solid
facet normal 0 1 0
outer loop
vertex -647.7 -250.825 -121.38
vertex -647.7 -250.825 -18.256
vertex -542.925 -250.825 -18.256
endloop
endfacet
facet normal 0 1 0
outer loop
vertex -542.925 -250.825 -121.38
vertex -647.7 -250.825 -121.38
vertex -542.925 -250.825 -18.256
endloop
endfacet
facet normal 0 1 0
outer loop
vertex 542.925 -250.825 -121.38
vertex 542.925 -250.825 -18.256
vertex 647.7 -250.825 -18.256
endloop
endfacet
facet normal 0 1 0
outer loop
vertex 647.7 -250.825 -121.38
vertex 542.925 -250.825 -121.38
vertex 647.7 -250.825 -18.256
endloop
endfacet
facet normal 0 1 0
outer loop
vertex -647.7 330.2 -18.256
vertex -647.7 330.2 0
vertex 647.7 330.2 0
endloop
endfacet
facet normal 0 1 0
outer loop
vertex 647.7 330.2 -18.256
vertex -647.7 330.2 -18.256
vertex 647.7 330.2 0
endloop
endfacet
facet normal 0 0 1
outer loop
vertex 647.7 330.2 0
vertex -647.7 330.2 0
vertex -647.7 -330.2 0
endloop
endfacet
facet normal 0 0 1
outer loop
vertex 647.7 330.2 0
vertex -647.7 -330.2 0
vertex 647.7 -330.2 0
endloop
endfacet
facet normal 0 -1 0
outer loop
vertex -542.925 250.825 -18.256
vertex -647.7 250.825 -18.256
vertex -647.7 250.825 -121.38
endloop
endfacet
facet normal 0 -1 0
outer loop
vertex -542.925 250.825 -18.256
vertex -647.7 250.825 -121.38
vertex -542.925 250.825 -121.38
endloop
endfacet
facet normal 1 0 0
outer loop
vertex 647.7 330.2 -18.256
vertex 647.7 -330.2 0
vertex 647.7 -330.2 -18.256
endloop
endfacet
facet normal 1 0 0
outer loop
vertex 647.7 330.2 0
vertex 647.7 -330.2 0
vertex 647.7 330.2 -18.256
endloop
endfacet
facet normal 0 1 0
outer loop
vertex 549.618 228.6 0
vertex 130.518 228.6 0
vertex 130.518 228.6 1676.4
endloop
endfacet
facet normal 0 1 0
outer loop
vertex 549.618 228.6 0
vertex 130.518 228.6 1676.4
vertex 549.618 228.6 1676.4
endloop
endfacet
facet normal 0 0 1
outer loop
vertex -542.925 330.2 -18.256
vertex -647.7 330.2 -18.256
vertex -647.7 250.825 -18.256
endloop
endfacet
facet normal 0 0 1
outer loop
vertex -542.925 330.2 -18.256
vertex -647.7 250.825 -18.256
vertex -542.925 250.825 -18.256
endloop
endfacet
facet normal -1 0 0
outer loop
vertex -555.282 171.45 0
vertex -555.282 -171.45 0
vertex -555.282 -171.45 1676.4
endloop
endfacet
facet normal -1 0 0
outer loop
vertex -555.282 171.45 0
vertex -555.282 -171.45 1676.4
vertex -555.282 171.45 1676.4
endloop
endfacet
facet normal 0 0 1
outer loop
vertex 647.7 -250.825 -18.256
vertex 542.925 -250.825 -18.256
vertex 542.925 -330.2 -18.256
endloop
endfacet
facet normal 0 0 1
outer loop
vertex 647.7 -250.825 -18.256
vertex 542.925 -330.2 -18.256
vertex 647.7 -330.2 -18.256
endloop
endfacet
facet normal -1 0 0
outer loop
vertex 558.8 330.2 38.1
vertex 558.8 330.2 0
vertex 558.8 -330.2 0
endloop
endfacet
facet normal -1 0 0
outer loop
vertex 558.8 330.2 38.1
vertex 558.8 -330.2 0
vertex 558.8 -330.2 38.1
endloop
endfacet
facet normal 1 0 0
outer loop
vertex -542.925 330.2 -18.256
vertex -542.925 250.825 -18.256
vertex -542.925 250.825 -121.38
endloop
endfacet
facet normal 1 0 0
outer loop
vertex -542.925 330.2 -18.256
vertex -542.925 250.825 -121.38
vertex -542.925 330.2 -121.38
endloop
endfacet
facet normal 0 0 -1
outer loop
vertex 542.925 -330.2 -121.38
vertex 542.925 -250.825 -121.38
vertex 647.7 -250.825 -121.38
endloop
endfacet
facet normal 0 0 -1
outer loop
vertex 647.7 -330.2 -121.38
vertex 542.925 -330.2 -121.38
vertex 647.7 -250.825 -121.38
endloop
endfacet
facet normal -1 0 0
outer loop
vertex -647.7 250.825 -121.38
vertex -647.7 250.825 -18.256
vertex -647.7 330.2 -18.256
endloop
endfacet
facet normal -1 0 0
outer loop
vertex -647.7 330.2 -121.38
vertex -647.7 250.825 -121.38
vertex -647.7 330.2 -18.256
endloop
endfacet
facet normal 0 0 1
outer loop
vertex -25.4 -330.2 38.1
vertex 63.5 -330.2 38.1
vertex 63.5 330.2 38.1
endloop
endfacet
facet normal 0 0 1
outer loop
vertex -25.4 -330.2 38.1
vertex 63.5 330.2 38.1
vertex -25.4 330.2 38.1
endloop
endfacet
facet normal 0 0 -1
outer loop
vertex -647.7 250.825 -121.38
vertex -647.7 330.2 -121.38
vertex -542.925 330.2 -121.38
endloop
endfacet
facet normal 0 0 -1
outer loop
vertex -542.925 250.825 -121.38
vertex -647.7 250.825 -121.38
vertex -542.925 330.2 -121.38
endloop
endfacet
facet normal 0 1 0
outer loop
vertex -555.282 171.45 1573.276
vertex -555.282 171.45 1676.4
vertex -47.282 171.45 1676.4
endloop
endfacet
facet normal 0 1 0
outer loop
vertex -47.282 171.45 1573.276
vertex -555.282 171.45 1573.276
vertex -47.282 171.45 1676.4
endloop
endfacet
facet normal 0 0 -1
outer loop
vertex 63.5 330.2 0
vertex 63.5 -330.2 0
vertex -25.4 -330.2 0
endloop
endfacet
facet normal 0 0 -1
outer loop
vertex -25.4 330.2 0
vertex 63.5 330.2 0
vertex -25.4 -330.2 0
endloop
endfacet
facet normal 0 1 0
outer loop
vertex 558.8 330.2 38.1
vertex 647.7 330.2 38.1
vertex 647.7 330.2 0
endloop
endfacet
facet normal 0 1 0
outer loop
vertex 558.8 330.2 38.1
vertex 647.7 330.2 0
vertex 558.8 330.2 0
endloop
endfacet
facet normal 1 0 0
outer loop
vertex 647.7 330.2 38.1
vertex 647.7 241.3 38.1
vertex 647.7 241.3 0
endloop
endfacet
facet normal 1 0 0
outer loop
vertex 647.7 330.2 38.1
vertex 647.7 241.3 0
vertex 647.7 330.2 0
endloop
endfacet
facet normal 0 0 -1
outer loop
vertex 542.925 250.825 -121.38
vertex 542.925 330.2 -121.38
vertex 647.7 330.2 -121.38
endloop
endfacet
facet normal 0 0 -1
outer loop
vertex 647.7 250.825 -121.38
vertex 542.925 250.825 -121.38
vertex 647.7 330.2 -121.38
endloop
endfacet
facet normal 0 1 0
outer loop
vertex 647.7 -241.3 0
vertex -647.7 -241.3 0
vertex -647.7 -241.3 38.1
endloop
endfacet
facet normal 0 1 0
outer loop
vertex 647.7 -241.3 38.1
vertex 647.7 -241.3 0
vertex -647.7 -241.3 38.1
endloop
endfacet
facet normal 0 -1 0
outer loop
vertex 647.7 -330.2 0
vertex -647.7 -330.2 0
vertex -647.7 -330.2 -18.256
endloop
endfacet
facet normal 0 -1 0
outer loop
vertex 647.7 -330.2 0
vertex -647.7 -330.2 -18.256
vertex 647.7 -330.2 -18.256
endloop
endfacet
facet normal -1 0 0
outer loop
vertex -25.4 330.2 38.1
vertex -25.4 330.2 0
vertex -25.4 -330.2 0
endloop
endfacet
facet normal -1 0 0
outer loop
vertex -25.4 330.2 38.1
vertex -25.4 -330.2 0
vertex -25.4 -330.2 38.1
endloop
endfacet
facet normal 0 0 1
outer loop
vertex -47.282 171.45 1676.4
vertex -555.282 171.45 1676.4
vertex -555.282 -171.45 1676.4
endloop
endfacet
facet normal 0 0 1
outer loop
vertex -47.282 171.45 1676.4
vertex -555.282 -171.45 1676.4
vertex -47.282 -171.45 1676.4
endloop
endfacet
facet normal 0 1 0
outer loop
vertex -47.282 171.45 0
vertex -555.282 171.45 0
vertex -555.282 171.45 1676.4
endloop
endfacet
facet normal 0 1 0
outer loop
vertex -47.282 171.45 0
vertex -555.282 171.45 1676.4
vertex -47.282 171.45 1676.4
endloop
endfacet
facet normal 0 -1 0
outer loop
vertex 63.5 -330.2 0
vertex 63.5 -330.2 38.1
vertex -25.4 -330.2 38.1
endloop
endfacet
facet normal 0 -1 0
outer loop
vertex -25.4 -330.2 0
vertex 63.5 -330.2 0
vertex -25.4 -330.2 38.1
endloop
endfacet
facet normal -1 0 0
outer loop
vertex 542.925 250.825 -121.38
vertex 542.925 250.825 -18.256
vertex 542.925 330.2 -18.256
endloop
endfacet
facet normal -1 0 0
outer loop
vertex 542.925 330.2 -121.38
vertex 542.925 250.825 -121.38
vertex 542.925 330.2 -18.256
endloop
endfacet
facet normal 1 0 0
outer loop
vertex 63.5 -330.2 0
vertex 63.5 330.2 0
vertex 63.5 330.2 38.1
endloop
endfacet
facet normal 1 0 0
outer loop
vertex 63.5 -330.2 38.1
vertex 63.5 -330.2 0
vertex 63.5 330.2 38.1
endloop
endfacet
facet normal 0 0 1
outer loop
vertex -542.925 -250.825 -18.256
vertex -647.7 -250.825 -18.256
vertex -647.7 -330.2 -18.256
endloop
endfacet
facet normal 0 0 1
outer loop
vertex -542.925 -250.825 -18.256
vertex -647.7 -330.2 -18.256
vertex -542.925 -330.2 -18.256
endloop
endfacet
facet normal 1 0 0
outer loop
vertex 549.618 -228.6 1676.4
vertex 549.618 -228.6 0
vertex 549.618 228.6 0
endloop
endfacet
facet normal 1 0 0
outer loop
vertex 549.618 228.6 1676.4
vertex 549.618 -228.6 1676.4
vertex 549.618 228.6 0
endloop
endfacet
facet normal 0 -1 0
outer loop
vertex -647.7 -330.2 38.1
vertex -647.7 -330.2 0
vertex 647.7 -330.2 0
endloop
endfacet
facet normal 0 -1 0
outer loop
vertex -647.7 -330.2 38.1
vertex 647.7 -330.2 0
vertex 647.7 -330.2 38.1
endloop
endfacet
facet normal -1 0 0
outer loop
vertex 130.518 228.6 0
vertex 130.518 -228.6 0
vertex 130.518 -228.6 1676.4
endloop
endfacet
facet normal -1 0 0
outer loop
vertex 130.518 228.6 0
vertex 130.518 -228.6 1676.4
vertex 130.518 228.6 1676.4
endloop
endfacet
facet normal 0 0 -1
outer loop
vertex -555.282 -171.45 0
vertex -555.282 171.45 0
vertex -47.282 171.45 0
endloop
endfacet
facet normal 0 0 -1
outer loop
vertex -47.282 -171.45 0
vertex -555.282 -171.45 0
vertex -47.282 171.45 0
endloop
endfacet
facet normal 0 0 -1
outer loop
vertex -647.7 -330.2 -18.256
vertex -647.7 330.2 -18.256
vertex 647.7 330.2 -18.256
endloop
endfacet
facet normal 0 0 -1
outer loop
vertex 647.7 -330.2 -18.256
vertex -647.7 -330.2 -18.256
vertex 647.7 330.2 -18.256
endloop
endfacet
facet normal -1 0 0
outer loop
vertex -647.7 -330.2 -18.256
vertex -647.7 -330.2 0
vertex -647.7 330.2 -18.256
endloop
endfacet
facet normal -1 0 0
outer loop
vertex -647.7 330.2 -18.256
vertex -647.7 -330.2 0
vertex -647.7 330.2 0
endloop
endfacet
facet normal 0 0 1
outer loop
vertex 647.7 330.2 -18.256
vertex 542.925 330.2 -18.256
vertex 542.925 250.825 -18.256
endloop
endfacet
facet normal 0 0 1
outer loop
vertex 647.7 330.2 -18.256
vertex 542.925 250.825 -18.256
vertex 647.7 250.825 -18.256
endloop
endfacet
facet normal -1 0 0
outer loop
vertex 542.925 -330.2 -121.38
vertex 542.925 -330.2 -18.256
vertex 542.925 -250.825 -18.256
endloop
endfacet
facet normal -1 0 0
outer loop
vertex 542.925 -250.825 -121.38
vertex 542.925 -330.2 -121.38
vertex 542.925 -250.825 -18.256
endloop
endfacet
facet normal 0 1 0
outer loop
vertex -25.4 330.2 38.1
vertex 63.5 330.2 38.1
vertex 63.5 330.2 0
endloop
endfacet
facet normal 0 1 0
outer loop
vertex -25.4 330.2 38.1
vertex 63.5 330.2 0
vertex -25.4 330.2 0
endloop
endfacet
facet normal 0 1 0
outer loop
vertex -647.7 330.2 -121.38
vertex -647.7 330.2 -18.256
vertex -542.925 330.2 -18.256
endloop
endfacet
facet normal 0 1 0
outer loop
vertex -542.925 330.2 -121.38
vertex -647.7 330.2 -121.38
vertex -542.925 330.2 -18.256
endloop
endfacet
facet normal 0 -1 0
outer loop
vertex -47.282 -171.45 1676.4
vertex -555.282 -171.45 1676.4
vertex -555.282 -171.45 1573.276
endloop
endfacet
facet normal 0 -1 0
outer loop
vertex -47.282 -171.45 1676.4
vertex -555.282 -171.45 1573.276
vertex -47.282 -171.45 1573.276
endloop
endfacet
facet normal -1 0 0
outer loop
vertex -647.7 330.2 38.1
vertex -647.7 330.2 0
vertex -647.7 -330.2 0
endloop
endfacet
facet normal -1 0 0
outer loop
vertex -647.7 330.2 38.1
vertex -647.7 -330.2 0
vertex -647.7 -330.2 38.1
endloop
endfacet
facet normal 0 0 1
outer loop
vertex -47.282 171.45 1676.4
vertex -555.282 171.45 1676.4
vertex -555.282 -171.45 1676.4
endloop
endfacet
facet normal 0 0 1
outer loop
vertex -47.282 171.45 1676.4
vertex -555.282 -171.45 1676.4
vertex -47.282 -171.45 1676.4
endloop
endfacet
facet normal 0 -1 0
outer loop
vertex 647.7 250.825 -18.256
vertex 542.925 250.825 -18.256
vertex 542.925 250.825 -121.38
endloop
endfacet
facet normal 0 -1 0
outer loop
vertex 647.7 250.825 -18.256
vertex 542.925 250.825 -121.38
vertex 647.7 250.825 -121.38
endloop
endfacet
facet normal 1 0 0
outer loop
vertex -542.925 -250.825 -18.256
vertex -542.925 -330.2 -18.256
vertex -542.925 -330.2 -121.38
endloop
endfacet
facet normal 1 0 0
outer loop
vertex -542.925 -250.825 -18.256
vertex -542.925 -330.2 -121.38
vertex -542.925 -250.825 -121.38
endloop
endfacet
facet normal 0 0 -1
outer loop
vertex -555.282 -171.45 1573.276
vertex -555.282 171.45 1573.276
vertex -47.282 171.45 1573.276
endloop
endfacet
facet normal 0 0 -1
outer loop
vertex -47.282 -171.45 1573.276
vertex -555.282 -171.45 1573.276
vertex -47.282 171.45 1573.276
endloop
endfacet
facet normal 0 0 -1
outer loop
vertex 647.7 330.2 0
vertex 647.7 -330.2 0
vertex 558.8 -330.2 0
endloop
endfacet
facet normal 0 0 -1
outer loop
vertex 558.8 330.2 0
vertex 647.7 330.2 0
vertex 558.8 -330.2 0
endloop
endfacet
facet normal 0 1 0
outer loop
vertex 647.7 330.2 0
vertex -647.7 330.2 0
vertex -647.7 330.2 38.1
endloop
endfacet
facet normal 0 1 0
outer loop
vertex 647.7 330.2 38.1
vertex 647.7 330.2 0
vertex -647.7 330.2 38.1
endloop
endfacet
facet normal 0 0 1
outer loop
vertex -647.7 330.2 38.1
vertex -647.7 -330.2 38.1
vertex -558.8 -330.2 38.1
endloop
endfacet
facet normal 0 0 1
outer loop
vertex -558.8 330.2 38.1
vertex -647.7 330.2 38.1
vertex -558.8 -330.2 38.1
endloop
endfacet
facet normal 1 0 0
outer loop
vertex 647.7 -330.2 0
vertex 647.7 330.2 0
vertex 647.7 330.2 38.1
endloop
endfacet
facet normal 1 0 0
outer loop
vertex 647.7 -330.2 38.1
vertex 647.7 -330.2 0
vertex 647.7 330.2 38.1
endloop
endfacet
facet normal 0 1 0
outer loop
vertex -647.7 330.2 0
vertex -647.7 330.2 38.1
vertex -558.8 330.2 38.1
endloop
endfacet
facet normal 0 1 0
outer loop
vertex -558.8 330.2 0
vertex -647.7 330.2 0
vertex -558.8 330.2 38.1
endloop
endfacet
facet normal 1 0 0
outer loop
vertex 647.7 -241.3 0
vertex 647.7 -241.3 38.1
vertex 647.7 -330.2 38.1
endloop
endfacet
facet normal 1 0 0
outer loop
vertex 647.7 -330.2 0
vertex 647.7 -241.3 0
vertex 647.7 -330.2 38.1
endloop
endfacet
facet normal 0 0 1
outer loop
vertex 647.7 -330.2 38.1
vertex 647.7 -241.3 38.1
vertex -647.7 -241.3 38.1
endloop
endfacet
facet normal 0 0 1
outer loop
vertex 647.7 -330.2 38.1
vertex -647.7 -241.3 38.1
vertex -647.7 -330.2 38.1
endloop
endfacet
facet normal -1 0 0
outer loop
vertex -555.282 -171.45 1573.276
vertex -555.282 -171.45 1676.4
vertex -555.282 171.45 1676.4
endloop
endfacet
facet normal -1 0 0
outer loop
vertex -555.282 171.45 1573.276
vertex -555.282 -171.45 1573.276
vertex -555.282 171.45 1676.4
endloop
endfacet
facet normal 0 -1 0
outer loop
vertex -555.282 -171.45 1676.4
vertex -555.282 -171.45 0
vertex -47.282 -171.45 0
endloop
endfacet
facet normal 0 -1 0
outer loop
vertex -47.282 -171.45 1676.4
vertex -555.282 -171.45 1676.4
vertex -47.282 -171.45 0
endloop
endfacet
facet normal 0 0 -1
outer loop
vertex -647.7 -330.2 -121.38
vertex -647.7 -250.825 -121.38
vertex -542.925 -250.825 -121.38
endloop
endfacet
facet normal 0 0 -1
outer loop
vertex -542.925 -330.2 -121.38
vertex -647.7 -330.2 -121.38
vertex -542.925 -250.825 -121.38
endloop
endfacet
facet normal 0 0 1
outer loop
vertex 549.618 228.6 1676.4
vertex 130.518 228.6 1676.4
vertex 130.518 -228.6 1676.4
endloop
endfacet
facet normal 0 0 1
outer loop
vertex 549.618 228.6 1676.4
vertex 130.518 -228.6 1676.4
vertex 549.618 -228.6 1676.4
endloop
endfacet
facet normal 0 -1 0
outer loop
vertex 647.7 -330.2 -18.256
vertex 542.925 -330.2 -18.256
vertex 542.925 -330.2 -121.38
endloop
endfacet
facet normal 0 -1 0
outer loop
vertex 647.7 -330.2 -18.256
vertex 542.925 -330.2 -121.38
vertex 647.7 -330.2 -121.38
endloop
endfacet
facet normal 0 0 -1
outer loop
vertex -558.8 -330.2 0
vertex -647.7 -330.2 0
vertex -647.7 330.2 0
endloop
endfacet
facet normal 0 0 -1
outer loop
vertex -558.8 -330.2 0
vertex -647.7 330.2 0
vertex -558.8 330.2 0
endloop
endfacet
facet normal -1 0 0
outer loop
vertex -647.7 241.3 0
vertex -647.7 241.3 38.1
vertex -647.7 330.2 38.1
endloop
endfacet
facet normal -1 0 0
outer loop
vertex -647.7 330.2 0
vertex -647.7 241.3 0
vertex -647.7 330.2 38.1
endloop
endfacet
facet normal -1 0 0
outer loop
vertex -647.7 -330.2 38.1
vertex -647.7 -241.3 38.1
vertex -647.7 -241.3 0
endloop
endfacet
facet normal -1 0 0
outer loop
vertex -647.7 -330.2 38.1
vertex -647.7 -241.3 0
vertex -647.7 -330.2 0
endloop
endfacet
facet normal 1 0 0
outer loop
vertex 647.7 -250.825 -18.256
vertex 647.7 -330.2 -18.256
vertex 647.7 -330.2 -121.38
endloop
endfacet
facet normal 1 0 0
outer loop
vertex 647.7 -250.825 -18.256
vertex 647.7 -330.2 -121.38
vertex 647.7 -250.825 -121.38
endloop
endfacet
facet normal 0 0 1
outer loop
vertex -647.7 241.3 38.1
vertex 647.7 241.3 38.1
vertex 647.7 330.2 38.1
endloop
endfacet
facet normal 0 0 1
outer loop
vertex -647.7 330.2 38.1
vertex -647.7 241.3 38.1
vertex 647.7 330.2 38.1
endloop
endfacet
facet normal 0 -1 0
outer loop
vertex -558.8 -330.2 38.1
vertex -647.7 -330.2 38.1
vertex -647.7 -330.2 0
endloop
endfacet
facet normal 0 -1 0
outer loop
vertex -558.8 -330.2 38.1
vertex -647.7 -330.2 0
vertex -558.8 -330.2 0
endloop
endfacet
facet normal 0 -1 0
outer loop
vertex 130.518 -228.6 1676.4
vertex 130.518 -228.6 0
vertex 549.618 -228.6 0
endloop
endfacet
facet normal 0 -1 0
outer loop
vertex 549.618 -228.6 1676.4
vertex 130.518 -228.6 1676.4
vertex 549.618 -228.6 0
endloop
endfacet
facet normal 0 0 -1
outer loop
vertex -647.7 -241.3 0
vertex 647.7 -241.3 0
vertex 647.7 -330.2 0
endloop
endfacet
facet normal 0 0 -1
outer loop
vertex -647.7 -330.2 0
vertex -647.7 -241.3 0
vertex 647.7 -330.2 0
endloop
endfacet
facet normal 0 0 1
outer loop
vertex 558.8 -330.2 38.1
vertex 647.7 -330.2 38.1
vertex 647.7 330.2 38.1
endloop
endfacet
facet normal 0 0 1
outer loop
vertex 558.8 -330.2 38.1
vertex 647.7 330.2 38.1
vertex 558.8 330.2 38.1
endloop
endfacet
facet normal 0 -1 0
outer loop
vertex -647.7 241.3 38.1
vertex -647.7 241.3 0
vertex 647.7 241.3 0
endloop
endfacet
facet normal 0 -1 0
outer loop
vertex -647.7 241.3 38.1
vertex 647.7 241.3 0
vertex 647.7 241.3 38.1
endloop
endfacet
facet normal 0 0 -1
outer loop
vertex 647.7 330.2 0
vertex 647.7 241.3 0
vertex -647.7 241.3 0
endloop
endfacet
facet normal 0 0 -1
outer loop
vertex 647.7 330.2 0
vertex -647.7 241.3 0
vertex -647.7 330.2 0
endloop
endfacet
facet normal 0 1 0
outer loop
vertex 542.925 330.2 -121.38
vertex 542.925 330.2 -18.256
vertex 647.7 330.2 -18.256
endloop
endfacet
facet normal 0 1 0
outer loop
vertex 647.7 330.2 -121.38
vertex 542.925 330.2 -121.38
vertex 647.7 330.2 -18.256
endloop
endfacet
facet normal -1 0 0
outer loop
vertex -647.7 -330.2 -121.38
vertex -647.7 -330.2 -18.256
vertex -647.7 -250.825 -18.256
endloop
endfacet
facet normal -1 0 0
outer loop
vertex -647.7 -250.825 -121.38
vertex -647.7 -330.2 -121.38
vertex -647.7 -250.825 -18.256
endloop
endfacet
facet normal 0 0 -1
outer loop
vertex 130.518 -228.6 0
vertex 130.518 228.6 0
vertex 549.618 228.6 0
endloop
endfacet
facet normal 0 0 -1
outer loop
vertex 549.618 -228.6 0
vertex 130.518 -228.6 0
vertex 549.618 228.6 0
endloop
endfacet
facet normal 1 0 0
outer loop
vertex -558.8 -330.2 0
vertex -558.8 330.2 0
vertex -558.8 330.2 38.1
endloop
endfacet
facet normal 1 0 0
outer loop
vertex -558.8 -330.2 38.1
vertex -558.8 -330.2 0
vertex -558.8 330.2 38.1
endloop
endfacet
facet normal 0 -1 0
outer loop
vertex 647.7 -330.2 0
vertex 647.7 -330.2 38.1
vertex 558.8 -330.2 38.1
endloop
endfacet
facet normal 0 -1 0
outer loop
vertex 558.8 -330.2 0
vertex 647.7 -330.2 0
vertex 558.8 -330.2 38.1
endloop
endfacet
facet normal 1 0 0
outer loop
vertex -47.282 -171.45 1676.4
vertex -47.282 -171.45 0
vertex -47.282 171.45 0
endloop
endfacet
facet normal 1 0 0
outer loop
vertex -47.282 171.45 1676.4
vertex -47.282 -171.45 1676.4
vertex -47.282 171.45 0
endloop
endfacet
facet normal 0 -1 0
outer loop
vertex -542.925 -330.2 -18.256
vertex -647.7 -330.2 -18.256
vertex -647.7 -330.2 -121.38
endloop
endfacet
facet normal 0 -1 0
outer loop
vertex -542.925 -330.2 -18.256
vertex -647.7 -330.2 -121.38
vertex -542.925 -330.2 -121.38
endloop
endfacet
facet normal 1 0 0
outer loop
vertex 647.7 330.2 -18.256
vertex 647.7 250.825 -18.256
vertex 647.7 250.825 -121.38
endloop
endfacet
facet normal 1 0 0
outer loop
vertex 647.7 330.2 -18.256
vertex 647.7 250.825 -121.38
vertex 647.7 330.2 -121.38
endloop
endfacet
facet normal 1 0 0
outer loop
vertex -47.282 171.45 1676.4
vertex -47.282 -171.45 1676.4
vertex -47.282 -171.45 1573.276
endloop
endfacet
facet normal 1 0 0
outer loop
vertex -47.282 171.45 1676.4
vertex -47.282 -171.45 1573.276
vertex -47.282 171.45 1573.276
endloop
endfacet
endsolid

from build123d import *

# Parameters (mm, degrees)
F1_W      = 508
F1_H      = 342.9
F2_DEPTH  = 1676.4
F3_W      = 419.1
F3_H      = 457.2
F4_DEPTH  = 1676.4
F6_W      = 104.775
F6_H      = 79.375
F2_FACE_W = 508
F2_FACE_H = 342.9
F7_DEPTH  = 103.124
F8_W      = 1295.4
F8_H      = 660.4
F9_DEPTH  = 18.25625
F10_W     = 88.9
F10_H     = 38.1
F11_DEPTH = 1295.4
F13_W     = 88.9
F13_H     = 38.1
F14_DEPTH = 660.4


with BuildPart() as f2:
    # F1 (on Top) → F2 (new body)
    with BuildSketch(Plane.XY):
        with Locations((-301.2818683147, 0)):
            Rectangle(F1_W, F1_H)
    extrude(amount=F2_DEPTH)


with BuildPart() as f4:
    # F3 (on Top) → F4 (new body)
    with BuildSketch(Plane.XY):
        with Locations((340.0681316853, 0)):
            Rectangle(F3_W, F3_H)
    extrude(amount=F4_DEPTH)


with BuildPart() as f7:
    # F6 (on offset) + F2_face (on face) → F7 (new body)
    with BuildSketch(Plane.XY.offset(-18.25625)):
        with Locations((-595.3125, -290.5125)):
            Rectangle(F6_W, F6_H)
        with Locations((595.3125, -290.5125)):
            Rectangle(F6_W, F6_H)
        with Locations((-595.3125, 290.5125)):
            Rectangle(F6_W, F6_H)
        with Locations((595.3125, 290.5125)):
            Rectangle(F6_W, F6_H)
    with BuildSketch(Plane(origin=(-301.2818683147, 0, 1676.4), x_dir=(1, 0, 0), z_dir=(0, 0, 1))):
        Rectangle(F2_FACE_W, F2_FACE_H)
    extrude(amount=-F7_DEPTH)


with BuildPart() as f9:
    # F8 (on Top) → F9 (new body)
    with BuildSketch(Plane.XY):
        Rectangle(F8_W, F8_H)
    extrude(amount=-F9_DEPTH)


with BuildPart() as f11:
    # F10 (on face) → F11 (new body, through all)
    with BuildSketch(Plane(origin=(-647.7, 0, 0), x_dir=(0, -1, 0), z_dir=(-1, 0, 0))):
        with Locations((285.75, 19.05)):
            Rectangle(F10_W, F10_H)
    extrude(amount=-F11_DEPTH)


with BuildPart() as f12_1:
    # F12: instance of F11
    add(f11.part.mirror(Plane.XZ))


with BuildPart() as f14:
    # F13 (on face) → F14 (new body, through all)
    with BuildSketch(Plane.XZ.offset(330.2)):
        with Locations((-603.25, 19.05)):
            Rectangle(F13_W, F13_H)
    extrude(amount=-F14_DEPTH)


with BuildPart() as f17_1:
    # F17: instance of F14
    add(f14.part.mirror(Plane(origin=(0, -285.75, 19.05), x_dir=(0, -1, 0), z_dir=(-1, 0, 0))))


with BuildPart() as f19_1:
    # F19: instance of F14
    add(f14.part.mirror(Plane(origin=(-292.1, -285.75, 19.05), x_dir=(0, -1, 0), z_dir=(-1, 0, 0))))


solid = Compound([f2.part, f4.part, f7.part, f9.part, f11.part, f12_1.part, f14.part, f17_1.part, f19_1.part])
